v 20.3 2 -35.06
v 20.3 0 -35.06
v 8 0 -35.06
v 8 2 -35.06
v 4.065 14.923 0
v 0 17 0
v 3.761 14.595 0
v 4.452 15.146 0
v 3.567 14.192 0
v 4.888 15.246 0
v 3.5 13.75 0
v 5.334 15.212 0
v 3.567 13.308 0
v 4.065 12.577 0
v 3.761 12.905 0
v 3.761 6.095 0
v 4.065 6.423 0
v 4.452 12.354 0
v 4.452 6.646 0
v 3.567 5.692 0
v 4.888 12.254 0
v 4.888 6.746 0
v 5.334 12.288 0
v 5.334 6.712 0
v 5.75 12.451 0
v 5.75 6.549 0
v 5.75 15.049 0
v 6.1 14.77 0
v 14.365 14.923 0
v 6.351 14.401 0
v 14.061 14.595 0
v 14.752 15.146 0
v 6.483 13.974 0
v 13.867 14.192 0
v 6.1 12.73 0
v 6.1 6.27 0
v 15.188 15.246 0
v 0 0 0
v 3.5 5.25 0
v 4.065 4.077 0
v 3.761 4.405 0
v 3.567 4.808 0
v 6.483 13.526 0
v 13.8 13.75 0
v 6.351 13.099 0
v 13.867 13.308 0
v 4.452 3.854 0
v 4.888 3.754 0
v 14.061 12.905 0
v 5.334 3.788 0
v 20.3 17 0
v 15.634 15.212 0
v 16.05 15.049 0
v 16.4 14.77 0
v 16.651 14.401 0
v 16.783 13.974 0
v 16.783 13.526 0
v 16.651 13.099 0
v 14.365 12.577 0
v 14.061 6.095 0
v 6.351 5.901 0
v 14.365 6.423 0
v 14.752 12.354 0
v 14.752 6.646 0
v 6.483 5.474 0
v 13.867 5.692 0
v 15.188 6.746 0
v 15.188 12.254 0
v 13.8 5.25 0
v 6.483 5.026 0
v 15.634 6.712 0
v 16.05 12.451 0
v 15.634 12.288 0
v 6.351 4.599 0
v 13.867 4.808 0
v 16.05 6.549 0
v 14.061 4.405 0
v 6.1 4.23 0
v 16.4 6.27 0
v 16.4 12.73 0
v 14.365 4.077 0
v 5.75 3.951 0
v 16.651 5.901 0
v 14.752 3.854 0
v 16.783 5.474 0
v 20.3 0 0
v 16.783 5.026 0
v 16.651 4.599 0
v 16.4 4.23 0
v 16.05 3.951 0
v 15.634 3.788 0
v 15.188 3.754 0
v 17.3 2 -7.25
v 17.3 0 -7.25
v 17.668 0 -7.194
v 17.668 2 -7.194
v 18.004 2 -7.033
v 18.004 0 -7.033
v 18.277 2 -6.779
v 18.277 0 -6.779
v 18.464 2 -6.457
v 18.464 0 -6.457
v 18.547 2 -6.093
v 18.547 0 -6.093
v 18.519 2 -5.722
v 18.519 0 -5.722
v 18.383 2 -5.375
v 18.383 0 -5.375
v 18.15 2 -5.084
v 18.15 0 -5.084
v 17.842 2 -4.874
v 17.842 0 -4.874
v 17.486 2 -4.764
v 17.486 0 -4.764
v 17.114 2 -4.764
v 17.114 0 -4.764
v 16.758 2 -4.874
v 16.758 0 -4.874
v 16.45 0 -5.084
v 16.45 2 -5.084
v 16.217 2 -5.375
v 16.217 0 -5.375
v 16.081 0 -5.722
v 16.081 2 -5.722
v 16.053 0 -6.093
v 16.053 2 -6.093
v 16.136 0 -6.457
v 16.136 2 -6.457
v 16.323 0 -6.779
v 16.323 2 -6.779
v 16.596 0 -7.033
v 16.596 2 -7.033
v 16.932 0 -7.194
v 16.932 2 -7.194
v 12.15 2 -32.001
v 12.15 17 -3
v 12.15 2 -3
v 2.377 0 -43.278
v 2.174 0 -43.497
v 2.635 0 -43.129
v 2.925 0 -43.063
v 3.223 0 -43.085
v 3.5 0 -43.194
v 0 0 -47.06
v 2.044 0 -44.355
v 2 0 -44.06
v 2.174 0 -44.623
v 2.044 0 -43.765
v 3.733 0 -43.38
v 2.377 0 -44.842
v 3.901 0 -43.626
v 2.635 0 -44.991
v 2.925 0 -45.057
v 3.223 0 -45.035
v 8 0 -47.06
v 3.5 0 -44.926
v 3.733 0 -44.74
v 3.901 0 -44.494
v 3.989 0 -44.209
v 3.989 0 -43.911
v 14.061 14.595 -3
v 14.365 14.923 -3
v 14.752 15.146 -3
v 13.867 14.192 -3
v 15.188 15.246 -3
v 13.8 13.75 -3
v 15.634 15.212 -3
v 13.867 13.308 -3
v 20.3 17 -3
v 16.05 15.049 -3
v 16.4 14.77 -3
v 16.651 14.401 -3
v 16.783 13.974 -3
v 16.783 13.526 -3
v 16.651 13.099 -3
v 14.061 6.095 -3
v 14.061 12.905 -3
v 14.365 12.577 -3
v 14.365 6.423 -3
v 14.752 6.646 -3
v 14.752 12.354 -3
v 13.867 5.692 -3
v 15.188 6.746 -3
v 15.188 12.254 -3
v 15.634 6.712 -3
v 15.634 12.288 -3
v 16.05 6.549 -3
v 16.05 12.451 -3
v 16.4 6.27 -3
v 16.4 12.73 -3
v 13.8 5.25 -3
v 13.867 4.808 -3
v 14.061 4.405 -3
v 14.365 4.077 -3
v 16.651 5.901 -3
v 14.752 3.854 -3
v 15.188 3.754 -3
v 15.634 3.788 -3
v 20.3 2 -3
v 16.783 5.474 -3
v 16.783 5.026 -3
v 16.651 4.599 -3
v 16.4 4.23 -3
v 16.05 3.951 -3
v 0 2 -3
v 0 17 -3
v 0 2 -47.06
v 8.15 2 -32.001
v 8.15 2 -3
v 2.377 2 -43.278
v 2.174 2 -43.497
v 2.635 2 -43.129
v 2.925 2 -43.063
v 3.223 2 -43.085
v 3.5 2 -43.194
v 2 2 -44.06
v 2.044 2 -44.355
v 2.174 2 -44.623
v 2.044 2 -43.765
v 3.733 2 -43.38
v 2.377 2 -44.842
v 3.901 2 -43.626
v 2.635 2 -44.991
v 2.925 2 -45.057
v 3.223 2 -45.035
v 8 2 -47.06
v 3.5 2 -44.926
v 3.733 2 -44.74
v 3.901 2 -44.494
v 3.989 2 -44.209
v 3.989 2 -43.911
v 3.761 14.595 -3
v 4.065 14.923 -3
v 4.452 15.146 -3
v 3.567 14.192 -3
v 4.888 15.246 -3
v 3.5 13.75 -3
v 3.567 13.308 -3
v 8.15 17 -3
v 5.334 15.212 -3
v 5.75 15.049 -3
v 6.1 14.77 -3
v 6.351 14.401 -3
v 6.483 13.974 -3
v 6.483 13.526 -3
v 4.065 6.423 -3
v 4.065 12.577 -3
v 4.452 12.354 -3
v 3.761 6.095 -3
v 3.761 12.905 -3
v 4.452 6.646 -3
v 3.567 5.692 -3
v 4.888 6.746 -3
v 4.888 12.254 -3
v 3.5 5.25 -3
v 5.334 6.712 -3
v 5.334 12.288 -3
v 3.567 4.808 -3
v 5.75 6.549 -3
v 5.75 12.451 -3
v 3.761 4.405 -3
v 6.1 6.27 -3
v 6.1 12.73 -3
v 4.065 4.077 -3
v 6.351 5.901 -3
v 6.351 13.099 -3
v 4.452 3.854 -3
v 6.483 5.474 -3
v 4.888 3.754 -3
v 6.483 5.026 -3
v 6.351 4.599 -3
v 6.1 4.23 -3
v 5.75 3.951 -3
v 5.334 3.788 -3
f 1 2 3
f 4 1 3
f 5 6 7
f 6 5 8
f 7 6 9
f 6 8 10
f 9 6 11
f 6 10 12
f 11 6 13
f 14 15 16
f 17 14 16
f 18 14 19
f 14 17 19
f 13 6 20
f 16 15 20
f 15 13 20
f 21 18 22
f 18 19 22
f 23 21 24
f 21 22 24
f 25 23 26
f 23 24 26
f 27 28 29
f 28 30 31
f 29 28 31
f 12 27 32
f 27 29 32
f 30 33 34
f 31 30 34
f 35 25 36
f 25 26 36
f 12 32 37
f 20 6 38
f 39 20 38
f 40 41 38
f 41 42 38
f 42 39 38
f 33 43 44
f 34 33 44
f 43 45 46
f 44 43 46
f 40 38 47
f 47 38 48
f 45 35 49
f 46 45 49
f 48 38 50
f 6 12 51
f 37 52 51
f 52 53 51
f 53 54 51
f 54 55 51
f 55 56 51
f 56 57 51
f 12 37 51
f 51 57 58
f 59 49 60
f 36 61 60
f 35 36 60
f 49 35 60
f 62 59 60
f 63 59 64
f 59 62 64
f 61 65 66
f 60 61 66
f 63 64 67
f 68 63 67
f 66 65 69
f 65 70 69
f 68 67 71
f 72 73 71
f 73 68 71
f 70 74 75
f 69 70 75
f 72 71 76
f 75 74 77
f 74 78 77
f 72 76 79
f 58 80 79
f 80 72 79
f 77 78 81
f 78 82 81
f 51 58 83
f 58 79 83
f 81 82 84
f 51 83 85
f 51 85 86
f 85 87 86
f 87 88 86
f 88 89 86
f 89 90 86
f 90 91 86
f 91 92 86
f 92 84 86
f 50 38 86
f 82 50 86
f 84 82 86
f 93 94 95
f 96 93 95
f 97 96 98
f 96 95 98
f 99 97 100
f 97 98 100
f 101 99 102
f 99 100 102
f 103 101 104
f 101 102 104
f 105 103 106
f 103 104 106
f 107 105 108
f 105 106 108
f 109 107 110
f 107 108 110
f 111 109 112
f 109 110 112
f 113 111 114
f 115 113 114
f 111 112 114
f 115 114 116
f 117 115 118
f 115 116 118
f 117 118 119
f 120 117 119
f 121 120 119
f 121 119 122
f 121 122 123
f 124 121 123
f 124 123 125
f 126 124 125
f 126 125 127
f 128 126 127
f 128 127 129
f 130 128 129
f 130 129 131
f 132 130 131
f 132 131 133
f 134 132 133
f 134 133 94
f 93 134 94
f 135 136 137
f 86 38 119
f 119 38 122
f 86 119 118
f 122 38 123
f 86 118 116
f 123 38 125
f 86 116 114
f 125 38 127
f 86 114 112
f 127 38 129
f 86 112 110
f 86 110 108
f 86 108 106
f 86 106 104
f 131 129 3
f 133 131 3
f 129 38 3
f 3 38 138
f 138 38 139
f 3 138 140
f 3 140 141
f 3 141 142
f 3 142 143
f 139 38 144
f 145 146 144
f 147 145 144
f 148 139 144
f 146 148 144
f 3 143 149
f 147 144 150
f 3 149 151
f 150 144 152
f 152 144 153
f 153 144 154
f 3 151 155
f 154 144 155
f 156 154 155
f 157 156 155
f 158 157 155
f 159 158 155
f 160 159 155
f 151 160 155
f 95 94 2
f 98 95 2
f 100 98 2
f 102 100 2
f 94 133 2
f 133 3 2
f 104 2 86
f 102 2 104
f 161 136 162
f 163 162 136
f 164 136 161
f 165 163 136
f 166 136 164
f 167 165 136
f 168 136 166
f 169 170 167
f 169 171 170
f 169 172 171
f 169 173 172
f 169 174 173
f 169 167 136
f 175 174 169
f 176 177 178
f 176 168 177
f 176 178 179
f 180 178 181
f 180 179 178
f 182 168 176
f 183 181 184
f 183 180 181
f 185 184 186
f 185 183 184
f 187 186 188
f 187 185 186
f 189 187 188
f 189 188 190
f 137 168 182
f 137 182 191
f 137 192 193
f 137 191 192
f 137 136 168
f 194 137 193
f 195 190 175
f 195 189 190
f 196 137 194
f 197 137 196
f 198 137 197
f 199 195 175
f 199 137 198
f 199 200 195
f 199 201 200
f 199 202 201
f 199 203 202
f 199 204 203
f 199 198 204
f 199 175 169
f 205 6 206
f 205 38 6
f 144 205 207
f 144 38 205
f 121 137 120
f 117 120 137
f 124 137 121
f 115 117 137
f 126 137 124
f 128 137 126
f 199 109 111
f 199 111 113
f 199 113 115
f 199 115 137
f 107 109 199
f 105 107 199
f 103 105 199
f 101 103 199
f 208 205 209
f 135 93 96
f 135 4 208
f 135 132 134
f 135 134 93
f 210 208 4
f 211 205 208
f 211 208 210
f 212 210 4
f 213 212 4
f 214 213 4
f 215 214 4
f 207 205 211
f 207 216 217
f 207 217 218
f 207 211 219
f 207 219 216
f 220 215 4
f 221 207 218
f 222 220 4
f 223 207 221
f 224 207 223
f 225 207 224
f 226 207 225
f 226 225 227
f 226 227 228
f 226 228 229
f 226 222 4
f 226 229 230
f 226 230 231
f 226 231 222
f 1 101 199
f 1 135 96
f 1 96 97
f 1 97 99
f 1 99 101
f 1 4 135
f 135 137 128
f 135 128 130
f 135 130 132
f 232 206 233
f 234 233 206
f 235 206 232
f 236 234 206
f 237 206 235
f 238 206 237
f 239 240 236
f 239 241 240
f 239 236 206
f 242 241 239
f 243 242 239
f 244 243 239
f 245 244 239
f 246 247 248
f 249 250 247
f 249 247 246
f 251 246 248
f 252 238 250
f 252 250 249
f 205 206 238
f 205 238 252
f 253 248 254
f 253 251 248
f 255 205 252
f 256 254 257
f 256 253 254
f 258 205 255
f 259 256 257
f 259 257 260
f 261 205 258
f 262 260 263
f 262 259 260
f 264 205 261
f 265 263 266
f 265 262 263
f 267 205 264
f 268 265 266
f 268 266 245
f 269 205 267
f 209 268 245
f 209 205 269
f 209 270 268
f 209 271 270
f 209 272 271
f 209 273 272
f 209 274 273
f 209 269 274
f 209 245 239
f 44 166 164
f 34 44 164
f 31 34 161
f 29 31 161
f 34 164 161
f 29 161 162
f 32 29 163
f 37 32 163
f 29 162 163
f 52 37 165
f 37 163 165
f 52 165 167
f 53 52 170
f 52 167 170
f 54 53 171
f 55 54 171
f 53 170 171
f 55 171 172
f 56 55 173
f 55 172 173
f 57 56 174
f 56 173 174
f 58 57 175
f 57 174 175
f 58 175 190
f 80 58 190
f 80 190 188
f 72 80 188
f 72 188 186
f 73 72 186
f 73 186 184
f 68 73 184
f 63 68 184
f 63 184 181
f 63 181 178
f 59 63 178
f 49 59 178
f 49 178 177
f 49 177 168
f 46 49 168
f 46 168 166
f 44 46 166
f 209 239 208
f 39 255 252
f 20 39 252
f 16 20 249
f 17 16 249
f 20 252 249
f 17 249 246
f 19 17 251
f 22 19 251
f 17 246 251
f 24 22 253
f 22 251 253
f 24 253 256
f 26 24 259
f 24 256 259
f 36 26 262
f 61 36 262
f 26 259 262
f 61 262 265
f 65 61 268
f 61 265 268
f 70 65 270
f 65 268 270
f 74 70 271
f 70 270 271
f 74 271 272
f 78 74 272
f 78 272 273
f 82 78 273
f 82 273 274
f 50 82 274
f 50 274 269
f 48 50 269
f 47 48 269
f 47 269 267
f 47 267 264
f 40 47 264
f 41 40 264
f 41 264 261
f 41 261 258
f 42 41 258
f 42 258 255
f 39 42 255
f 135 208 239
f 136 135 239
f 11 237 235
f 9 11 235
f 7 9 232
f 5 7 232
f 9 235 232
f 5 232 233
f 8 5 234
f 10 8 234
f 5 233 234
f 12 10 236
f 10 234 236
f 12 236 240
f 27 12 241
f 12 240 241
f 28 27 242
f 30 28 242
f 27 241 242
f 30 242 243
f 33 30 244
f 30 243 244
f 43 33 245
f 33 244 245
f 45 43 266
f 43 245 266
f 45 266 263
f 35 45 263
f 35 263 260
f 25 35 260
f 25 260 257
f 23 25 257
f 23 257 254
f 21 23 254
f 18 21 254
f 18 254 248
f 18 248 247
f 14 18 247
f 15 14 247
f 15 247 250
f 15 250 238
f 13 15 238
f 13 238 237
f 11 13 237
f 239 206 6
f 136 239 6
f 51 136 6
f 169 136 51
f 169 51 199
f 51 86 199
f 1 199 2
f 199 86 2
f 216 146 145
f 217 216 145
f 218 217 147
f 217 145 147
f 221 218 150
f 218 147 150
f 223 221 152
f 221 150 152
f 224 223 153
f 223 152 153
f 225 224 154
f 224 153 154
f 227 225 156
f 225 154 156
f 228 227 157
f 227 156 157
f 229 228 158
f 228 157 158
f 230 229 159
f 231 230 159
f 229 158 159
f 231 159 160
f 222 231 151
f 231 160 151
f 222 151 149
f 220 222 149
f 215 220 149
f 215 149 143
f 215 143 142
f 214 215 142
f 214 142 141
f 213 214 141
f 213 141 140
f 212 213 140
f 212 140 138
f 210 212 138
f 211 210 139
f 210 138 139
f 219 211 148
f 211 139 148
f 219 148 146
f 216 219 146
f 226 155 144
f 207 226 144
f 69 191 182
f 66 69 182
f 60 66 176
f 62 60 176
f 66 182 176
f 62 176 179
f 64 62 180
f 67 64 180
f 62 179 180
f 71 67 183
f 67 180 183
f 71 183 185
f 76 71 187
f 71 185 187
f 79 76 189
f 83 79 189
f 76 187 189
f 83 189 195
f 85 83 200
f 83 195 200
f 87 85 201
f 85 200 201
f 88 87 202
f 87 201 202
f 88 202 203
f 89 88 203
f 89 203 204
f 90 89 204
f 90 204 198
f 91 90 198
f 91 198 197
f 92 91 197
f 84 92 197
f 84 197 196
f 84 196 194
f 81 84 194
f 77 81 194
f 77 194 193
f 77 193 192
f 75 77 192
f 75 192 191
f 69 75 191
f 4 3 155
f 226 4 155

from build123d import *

# Parameters (mm, degrees)
EXTRUDE_1_DEPTH     = 2
SKETCH_2_W          = 20.3
SKETCH_2_H          = 3
EXTRUDE_2_DEPTH     = 15
SKETCH_3_R          = 1.5
CUT_EXTRUDE_1_DEPTH = 15
SKETCH_6_R          = 1.25
CUT_EXTRUDE_3_DEPTH = 10
EXTRUDE_3_DEPTH     = 2


with BuildPart() as part:
    # 草图1 → 凸台-拉伸1 (new body)
    with BuildSketch(Plane(origin=(0, 0, 0), x_dir=(1, 0, 0), z_dir=(0, 1, 0))):
        Polygon((8, 47.06), (0, 47.06), (0, 44.06), (0, 0), (20.3, 0), (20.3, 35.06), (8, 35.06), align=None)
        with BuildLine():
            ThreePointArc((4, 44.06), (3, 43.06), (2, 44.06))
            ThreePointArc((2, 44.06), (3, 45.06), (4, 44.06))
        make_face(mode=Mode.SUBTRACT)
    extrude(amount=EXTRUDE_1_DEPTH)

    # 草图2 → 凸台-拉伸2 (add)
    with BuildSketch(Plane(origin=(0, 2, 0), x_dir=(1, 0, 0), z_dir=(0, 1, 0))):
        with Locations((10.15, 1.5)):
            Rectangle(SKETCH_2_W, SKETCH_2_H)
    extrude(amount=EXTRUDE_2_DEPTH)

    # 草图3 → 切除-拉伸1 (cut)
    with BuildSketch(Plane(origin=(0, 0, -3), x_dir=(-1, 0, 0), z_dir=(0, 0, -1))):
        with Locations((-15.3, 13.75)):
            Circle(SKETCH_3_R)
        with Locations((-15.3, 5.25)):
            Circle(SKETCH_3_R)
        with Locations((-5, 13.75)):
            Circle(SKETCH_3_R)
        with Locations((-5, 5.25)):
            Circle(SKETCH_3_R)
    extrude(amount=-CUT_EXTRUDE_1_DEPTH, mode=Mode.SUBTRACT)

    # 草图6 → 切除-拉伸3 (cut)
    with BuildSketch(Plane.XZ):
        with Locations(Location((17.3, -6, 0), (0, 0, 270))):
            Circle(SKETCH_6_R)
    extrude(amount=-CUT_EXTRUDE_3_DEPTH, mode=Mode.SUBTRACT)

    # 草图7 → 凸台-拉伸3 (add, symmetric)
    with BuildSketch(Plane.ZY.offset(-10.15)):
        Polygon((-3, 17), (-3, 2), (-32.000508887, 2), align=None)
    extrude(amount=EXTRUDE_3_DEPTH, both=True)


solid = part.part
